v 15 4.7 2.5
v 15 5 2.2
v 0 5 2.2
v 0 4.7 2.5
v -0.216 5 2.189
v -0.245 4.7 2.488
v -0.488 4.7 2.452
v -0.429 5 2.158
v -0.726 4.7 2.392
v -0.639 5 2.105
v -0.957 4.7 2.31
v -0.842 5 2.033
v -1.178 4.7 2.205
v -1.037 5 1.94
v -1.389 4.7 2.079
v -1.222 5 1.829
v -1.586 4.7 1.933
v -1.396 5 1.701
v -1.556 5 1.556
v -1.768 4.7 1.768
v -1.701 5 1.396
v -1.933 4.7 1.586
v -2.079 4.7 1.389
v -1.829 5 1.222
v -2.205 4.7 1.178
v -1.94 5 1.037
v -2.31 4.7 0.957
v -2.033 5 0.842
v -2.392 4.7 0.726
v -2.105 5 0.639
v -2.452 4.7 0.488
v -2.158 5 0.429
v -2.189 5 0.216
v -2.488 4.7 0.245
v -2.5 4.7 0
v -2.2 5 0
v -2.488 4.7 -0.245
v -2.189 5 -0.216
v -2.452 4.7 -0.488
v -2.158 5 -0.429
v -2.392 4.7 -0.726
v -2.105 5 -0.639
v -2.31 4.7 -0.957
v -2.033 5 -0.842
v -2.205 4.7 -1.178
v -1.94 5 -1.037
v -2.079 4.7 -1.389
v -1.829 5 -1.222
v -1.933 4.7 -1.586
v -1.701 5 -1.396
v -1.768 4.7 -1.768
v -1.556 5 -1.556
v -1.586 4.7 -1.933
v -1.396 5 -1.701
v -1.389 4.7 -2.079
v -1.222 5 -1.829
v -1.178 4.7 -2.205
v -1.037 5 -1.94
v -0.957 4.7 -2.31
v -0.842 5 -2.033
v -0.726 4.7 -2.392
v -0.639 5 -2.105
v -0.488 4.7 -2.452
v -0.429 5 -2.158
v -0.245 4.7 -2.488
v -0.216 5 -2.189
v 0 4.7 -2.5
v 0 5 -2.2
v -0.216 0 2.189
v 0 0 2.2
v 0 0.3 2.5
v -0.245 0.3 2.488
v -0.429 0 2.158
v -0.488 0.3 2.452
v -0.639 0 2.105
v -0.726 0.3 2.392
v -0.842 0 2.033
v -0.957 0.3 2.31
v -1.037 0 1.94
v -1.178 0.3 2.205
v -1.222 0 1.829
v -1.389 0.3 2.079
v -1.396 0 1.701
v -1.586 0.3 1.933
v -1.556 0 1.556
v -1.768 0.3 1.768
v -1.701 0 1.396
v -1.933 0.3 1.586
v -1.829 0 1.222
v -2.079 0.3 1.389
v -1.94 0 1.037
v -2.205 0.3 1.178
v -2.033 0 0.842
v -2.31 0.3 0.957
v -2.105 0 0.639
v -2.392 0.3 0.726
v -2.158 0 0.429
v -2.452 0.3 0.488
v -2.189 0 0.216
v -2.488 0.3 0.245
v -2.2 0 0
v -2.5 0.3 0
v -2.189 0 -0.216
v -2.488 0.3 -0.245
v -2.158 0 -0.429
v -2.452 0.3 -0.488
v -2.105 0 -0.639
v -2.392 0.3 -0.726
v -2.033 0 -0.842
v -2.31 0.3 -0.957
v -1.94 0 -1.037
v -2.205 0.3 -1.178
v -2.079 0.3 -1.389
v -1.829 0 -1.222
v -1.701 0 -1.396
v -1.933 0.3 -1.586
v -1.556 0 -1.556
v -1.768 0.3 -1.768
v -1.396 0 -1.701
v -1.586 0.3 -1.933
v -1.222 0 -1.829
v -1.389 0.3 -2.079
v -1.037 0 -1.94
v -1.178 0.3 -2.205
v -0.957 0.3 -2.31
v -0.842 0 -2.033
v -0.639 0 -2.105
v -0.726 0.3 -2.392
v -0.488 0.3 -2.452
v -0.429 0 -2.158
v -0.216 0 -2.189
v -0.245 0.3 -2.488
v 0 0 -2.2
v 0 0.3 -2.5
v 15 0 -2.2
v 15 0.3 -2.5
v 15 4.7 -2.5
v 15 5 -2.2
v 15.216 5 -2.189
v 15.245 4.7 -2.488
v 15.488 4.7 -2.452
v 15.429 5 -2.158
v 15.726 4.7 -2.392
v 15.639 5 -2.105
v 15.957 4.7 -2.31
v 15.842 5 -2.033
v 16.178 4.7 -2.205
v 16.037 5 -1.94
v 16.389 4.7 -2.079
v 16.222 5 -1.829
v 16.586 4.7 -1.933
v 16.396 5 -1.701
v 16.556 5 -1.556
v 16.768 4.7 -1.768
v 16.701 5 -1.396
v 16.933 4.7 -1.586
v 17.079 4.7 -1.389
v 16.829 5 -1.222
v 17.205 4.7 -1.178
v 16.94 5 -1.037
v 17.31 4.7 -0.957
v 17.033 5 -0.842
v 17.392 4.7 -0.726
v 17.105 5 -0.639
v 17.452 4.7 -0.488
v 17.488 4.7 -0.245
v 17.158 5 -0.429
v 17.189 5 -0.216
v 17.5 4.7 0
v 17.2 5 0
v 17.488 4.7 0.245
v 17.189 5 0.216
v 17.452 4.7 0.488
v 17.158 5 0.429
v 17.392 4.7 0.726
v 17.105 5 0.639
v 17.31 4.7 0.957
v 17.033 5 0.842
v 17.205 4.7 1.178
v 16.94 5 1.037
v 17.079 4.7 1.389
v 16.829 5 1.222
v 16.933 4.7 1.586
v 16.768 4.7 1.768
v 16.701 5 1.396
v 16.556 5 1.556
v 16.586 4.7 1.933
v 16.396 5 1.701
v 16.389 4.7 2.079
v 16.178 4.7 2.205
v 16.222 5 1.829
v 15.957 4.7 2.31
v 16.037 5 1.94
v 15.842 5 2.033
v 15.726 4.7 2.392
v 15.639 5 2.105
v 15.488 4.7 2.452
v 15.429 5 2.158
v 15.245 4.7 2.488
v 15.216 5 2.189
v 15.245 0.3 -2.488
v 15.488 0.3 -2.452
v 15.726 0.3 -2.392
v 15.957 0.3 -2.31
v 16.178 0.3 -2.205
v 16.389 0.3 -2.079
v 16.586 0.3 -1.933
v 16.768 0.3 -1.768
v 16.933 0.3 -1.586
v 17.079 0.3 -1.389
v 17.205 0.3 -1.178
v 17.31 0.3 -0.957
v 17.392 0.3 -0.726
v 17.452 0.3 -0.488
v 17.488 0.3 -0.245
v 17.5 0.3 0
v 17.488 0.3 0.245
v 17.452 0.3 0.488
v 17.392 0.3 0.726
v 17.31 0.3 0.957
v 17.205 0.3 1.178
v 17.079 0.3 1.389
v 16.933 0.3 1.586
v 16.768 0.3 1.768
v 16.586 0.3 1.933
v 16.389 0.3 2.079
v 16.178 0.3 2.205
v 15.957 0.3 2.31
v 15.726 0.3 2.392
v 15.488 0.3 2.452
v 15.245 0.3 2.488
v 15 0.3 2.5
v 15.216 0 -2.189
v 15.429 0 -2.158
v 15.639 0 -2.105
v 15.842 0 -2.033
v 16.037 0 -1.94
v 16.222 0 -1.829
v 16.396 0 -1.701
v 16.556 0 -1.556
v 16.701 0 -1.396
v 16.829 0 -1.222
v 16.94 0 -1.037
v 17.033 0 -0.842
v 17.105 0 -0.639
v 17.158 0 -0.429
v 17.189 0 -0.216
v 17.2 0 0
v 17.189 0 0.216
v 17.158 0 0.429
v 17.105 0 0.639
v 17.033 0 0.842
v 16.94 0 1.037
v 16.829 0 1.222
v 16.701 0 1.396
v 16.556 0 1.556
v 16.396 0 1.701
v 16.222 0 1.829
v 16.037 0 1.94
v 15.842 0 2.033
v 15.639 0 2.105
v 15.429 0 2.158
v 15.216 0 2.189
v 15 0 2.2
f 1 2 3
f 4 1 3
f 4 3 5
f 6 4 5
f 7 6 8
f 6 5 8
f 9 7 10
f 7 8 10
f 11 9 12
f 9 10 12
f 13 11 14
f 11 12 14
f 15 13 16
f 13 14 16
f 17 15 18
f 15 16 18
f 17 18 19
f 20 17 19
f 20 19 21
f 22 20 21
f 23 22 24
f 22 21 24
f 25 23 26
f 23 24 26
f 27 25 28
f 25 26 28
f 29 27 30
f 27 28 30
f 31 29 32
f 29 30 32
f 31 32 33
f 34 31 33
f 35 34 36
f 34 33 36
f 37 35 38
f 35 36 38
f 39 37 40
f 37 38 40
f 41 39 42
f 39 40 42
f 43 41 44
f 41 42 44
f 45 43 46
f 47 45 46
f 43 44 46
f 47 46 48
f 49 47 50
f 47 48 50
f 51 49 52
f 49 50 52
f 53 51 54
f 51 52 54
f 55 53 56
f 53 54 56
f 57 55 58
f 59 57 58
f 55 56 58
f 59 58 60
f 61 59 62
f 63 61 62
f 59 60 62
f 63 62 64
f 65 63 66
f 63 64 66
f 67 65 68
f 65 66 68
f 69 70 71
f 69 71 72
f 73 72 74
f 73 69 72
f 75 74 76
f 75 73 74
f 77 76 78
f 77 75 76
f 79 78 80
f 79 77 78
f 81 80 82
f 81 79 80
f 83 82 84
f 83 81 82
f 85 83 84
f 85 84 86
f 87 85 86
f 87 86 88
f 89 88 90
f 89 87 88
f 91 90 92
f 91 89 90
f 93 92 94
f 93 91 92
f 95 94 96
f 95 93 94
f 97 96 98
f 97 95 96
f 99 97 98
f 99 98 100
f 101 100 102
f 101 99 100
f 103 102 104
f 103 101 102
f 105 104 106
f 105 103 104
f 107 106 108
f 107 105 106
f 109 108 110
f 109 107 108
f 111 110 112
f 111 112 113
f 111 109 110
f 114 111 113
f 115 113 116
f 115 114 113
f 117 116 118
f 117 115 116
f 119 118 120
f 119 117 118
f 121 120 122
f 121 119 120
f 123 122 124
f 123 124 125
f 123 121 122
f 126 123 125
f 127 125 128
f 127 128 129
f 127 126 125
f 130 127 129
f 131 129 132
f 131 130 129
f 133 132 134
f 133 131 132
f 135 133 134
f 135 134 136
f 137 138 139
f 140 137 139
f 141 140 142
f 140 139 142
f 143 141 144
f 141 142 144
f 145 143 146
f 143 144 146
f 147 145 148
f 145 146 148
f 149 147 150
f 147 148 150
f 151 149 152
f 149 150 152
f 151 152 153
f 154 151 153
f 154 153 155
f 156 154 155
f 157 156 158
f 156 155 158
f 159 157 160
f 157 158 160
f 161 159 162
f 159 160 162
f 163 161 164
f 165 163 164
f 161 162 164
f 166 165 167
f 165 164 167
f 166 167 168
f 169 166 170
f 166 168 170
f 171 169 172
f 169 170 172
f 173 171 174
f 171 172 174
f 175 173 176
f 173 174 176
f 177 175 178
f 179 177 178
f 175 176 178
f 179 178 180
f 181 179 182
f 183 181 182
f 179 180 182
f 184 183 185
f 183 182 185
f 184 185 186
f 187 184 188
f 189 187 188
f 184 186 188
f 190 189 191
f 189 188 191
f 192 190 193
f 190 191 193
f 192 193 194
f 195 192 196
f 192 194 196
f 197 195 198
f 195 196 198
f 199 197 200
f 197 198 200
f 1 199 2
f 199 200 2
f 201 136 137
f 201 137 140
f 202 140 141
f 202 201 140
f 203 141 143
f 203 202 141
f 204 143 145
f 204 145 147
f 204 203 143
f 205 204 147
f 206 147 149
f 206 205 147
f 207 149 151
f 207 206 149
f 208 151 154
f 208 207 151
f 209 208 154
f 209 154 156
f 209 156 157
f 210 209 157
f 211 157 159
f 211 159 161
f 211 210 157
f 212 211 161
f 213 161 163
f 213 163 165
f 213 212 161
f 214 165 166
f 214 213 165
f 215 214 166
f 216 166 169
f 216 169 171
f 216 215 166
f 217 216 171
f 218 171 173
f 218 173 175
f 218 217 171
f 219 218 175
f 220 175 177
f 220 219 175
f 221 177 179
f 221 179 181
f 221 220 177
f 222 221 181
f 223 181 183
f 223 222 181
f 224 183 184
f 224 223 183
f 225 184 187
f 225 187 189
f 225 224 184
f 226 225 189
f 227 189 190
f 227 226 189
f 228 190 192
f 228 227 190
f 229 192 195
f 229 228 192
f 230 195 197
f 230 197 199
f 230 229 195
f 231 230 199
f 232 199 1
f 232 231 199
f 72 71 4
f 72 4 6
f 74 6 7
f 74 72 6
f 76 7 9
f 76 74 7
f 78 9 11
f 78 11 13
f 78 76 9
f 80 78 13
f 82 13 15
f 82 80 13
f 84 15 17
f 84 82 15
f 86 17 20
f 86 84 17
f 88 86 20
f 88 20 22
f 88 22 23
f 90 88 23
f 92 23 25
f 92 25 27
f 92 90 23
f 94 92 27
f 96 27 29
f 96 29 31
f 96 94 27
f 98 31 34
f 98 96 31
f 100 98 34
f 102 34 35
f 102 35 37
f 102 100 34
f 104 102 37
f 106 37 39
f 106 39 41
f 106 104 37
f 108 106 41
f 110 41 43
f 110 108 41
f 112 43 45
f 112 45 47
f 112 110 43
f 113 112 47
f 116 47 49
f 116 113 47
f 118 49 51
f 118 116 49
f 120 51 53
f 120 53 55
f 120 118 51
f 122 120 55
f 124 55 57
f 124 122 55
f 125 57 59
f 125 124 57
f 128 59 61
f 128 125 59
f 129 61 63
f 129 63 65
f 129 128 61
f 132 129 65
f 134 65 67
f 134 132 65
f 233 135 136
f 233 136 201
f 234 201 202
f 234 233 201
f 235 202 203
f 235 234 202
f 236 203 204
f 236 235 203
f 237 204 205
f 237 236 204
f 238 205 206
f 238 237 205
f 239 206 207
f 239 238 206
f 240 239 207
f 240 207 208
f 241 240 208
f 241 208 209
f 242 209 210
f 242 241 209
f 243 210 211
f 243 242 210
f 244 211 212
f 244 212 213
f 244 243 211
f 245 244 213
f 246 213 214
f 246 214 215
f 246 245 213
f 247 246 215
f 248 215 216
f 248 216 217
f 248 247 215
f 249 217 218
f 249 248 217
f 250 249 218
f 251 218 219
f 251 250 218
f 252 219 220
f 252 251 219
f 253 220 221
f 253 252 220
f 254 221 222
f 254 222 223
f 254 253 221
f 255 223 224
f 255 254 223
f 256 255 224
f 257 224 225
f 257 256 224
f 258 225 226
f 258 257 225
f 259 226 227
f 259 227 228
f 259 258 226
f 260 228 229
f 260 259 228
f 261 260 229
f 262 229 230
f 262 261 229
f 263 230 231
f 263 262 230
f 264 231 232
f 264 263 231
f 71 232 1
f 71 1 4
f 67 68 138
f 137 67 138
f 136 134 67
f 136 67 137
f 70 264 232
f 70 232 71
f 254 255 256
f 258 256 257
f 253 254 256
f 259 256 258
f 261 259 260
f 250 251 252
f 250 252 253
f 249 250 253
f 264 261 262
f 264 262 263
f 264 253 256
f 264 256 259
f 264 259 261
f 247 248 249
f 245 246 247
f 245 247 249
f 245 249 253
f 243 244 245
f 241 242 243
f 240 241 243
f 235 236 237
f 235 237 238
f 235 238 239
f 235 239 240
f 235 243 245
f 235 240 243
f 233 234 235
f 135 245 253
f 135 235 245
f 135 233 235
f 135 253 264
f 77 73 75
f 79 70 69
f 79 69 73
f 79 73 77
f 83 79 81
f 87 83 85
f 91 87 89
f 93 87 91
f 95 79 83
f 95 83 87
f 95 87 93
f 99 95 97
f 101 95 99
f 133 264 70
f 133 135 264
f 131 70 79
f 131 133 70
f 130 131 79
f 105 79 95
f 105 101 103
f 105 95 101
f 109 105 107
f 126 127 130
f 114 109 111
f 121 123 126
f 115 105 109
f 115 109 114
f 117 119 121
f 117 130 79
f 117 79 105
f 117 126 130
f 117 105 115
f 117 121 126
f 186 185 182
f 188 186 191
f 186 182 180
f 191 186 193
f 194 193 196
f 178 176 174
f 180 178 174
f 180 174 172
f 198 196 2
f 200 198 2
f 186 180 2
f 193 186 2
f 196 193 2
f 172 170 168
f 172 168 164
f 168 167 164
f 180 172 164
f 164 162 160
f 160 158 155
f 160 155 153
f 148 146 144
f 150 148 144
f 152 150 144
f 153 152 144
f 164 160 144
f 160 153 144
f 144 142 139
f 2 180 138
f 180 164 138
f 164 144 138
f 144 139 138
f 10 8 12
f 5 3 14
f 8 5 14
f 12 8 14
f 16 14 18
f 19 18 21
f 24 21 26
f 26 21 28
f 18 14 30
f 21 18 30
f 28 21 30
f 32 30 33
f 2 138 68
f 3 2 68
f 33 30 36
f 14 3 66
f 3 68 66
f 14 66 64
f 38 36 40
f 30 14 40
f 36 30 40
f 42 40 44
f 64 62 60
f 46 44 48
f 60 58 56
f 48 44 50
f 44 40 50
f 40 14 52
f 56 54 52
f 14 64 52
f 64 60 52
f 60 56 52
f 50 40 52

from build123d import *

# Parameters (mm, degrees)
BOSS_EXTRUDE1_DEPTH = 5
CHAMFER1_SIZE       = 0.3


with BuildPart() as part:
    # Sketch1 → Boss-Extrude1 (new body)
    with BuildSketch(Plane(origin=(0, 0, 0), x_dir=(1, 0, 0), z_dir=(0, 1, 0))):
        with BuildLine():
            Line((0, 2.5), (15, 2.5))
            ThreePointArc((15, 2.5), (17.5, 0), (15, -2.5))
            Line((15, -2.5), (0, -2.5))
            ThreePointArc((0, -2.5), (-2.5, 0), (0, 2.5))
        make_face()
    extrude(amount=BOSS_EXTRUDE1_DEPTH)

    # Chamfer1
    chamfer1_edges = [part.edges().sort_by_distance(p)[0] for p in [
        (17.5, 5, 0),
        (7.5, 5, -2.5),
        (-2.5, 5, 0),
        (7.5, 0, -2.5),
        (17.5, 0, 0),
        (7.5, 0, 2.5),
        (-2.5, 0, 0),
        (7.5, 5, 2.5),
    ]]
    chamfer(chamfer1_edges, length=CHAMFER1_SIZE)


solid = part.part
